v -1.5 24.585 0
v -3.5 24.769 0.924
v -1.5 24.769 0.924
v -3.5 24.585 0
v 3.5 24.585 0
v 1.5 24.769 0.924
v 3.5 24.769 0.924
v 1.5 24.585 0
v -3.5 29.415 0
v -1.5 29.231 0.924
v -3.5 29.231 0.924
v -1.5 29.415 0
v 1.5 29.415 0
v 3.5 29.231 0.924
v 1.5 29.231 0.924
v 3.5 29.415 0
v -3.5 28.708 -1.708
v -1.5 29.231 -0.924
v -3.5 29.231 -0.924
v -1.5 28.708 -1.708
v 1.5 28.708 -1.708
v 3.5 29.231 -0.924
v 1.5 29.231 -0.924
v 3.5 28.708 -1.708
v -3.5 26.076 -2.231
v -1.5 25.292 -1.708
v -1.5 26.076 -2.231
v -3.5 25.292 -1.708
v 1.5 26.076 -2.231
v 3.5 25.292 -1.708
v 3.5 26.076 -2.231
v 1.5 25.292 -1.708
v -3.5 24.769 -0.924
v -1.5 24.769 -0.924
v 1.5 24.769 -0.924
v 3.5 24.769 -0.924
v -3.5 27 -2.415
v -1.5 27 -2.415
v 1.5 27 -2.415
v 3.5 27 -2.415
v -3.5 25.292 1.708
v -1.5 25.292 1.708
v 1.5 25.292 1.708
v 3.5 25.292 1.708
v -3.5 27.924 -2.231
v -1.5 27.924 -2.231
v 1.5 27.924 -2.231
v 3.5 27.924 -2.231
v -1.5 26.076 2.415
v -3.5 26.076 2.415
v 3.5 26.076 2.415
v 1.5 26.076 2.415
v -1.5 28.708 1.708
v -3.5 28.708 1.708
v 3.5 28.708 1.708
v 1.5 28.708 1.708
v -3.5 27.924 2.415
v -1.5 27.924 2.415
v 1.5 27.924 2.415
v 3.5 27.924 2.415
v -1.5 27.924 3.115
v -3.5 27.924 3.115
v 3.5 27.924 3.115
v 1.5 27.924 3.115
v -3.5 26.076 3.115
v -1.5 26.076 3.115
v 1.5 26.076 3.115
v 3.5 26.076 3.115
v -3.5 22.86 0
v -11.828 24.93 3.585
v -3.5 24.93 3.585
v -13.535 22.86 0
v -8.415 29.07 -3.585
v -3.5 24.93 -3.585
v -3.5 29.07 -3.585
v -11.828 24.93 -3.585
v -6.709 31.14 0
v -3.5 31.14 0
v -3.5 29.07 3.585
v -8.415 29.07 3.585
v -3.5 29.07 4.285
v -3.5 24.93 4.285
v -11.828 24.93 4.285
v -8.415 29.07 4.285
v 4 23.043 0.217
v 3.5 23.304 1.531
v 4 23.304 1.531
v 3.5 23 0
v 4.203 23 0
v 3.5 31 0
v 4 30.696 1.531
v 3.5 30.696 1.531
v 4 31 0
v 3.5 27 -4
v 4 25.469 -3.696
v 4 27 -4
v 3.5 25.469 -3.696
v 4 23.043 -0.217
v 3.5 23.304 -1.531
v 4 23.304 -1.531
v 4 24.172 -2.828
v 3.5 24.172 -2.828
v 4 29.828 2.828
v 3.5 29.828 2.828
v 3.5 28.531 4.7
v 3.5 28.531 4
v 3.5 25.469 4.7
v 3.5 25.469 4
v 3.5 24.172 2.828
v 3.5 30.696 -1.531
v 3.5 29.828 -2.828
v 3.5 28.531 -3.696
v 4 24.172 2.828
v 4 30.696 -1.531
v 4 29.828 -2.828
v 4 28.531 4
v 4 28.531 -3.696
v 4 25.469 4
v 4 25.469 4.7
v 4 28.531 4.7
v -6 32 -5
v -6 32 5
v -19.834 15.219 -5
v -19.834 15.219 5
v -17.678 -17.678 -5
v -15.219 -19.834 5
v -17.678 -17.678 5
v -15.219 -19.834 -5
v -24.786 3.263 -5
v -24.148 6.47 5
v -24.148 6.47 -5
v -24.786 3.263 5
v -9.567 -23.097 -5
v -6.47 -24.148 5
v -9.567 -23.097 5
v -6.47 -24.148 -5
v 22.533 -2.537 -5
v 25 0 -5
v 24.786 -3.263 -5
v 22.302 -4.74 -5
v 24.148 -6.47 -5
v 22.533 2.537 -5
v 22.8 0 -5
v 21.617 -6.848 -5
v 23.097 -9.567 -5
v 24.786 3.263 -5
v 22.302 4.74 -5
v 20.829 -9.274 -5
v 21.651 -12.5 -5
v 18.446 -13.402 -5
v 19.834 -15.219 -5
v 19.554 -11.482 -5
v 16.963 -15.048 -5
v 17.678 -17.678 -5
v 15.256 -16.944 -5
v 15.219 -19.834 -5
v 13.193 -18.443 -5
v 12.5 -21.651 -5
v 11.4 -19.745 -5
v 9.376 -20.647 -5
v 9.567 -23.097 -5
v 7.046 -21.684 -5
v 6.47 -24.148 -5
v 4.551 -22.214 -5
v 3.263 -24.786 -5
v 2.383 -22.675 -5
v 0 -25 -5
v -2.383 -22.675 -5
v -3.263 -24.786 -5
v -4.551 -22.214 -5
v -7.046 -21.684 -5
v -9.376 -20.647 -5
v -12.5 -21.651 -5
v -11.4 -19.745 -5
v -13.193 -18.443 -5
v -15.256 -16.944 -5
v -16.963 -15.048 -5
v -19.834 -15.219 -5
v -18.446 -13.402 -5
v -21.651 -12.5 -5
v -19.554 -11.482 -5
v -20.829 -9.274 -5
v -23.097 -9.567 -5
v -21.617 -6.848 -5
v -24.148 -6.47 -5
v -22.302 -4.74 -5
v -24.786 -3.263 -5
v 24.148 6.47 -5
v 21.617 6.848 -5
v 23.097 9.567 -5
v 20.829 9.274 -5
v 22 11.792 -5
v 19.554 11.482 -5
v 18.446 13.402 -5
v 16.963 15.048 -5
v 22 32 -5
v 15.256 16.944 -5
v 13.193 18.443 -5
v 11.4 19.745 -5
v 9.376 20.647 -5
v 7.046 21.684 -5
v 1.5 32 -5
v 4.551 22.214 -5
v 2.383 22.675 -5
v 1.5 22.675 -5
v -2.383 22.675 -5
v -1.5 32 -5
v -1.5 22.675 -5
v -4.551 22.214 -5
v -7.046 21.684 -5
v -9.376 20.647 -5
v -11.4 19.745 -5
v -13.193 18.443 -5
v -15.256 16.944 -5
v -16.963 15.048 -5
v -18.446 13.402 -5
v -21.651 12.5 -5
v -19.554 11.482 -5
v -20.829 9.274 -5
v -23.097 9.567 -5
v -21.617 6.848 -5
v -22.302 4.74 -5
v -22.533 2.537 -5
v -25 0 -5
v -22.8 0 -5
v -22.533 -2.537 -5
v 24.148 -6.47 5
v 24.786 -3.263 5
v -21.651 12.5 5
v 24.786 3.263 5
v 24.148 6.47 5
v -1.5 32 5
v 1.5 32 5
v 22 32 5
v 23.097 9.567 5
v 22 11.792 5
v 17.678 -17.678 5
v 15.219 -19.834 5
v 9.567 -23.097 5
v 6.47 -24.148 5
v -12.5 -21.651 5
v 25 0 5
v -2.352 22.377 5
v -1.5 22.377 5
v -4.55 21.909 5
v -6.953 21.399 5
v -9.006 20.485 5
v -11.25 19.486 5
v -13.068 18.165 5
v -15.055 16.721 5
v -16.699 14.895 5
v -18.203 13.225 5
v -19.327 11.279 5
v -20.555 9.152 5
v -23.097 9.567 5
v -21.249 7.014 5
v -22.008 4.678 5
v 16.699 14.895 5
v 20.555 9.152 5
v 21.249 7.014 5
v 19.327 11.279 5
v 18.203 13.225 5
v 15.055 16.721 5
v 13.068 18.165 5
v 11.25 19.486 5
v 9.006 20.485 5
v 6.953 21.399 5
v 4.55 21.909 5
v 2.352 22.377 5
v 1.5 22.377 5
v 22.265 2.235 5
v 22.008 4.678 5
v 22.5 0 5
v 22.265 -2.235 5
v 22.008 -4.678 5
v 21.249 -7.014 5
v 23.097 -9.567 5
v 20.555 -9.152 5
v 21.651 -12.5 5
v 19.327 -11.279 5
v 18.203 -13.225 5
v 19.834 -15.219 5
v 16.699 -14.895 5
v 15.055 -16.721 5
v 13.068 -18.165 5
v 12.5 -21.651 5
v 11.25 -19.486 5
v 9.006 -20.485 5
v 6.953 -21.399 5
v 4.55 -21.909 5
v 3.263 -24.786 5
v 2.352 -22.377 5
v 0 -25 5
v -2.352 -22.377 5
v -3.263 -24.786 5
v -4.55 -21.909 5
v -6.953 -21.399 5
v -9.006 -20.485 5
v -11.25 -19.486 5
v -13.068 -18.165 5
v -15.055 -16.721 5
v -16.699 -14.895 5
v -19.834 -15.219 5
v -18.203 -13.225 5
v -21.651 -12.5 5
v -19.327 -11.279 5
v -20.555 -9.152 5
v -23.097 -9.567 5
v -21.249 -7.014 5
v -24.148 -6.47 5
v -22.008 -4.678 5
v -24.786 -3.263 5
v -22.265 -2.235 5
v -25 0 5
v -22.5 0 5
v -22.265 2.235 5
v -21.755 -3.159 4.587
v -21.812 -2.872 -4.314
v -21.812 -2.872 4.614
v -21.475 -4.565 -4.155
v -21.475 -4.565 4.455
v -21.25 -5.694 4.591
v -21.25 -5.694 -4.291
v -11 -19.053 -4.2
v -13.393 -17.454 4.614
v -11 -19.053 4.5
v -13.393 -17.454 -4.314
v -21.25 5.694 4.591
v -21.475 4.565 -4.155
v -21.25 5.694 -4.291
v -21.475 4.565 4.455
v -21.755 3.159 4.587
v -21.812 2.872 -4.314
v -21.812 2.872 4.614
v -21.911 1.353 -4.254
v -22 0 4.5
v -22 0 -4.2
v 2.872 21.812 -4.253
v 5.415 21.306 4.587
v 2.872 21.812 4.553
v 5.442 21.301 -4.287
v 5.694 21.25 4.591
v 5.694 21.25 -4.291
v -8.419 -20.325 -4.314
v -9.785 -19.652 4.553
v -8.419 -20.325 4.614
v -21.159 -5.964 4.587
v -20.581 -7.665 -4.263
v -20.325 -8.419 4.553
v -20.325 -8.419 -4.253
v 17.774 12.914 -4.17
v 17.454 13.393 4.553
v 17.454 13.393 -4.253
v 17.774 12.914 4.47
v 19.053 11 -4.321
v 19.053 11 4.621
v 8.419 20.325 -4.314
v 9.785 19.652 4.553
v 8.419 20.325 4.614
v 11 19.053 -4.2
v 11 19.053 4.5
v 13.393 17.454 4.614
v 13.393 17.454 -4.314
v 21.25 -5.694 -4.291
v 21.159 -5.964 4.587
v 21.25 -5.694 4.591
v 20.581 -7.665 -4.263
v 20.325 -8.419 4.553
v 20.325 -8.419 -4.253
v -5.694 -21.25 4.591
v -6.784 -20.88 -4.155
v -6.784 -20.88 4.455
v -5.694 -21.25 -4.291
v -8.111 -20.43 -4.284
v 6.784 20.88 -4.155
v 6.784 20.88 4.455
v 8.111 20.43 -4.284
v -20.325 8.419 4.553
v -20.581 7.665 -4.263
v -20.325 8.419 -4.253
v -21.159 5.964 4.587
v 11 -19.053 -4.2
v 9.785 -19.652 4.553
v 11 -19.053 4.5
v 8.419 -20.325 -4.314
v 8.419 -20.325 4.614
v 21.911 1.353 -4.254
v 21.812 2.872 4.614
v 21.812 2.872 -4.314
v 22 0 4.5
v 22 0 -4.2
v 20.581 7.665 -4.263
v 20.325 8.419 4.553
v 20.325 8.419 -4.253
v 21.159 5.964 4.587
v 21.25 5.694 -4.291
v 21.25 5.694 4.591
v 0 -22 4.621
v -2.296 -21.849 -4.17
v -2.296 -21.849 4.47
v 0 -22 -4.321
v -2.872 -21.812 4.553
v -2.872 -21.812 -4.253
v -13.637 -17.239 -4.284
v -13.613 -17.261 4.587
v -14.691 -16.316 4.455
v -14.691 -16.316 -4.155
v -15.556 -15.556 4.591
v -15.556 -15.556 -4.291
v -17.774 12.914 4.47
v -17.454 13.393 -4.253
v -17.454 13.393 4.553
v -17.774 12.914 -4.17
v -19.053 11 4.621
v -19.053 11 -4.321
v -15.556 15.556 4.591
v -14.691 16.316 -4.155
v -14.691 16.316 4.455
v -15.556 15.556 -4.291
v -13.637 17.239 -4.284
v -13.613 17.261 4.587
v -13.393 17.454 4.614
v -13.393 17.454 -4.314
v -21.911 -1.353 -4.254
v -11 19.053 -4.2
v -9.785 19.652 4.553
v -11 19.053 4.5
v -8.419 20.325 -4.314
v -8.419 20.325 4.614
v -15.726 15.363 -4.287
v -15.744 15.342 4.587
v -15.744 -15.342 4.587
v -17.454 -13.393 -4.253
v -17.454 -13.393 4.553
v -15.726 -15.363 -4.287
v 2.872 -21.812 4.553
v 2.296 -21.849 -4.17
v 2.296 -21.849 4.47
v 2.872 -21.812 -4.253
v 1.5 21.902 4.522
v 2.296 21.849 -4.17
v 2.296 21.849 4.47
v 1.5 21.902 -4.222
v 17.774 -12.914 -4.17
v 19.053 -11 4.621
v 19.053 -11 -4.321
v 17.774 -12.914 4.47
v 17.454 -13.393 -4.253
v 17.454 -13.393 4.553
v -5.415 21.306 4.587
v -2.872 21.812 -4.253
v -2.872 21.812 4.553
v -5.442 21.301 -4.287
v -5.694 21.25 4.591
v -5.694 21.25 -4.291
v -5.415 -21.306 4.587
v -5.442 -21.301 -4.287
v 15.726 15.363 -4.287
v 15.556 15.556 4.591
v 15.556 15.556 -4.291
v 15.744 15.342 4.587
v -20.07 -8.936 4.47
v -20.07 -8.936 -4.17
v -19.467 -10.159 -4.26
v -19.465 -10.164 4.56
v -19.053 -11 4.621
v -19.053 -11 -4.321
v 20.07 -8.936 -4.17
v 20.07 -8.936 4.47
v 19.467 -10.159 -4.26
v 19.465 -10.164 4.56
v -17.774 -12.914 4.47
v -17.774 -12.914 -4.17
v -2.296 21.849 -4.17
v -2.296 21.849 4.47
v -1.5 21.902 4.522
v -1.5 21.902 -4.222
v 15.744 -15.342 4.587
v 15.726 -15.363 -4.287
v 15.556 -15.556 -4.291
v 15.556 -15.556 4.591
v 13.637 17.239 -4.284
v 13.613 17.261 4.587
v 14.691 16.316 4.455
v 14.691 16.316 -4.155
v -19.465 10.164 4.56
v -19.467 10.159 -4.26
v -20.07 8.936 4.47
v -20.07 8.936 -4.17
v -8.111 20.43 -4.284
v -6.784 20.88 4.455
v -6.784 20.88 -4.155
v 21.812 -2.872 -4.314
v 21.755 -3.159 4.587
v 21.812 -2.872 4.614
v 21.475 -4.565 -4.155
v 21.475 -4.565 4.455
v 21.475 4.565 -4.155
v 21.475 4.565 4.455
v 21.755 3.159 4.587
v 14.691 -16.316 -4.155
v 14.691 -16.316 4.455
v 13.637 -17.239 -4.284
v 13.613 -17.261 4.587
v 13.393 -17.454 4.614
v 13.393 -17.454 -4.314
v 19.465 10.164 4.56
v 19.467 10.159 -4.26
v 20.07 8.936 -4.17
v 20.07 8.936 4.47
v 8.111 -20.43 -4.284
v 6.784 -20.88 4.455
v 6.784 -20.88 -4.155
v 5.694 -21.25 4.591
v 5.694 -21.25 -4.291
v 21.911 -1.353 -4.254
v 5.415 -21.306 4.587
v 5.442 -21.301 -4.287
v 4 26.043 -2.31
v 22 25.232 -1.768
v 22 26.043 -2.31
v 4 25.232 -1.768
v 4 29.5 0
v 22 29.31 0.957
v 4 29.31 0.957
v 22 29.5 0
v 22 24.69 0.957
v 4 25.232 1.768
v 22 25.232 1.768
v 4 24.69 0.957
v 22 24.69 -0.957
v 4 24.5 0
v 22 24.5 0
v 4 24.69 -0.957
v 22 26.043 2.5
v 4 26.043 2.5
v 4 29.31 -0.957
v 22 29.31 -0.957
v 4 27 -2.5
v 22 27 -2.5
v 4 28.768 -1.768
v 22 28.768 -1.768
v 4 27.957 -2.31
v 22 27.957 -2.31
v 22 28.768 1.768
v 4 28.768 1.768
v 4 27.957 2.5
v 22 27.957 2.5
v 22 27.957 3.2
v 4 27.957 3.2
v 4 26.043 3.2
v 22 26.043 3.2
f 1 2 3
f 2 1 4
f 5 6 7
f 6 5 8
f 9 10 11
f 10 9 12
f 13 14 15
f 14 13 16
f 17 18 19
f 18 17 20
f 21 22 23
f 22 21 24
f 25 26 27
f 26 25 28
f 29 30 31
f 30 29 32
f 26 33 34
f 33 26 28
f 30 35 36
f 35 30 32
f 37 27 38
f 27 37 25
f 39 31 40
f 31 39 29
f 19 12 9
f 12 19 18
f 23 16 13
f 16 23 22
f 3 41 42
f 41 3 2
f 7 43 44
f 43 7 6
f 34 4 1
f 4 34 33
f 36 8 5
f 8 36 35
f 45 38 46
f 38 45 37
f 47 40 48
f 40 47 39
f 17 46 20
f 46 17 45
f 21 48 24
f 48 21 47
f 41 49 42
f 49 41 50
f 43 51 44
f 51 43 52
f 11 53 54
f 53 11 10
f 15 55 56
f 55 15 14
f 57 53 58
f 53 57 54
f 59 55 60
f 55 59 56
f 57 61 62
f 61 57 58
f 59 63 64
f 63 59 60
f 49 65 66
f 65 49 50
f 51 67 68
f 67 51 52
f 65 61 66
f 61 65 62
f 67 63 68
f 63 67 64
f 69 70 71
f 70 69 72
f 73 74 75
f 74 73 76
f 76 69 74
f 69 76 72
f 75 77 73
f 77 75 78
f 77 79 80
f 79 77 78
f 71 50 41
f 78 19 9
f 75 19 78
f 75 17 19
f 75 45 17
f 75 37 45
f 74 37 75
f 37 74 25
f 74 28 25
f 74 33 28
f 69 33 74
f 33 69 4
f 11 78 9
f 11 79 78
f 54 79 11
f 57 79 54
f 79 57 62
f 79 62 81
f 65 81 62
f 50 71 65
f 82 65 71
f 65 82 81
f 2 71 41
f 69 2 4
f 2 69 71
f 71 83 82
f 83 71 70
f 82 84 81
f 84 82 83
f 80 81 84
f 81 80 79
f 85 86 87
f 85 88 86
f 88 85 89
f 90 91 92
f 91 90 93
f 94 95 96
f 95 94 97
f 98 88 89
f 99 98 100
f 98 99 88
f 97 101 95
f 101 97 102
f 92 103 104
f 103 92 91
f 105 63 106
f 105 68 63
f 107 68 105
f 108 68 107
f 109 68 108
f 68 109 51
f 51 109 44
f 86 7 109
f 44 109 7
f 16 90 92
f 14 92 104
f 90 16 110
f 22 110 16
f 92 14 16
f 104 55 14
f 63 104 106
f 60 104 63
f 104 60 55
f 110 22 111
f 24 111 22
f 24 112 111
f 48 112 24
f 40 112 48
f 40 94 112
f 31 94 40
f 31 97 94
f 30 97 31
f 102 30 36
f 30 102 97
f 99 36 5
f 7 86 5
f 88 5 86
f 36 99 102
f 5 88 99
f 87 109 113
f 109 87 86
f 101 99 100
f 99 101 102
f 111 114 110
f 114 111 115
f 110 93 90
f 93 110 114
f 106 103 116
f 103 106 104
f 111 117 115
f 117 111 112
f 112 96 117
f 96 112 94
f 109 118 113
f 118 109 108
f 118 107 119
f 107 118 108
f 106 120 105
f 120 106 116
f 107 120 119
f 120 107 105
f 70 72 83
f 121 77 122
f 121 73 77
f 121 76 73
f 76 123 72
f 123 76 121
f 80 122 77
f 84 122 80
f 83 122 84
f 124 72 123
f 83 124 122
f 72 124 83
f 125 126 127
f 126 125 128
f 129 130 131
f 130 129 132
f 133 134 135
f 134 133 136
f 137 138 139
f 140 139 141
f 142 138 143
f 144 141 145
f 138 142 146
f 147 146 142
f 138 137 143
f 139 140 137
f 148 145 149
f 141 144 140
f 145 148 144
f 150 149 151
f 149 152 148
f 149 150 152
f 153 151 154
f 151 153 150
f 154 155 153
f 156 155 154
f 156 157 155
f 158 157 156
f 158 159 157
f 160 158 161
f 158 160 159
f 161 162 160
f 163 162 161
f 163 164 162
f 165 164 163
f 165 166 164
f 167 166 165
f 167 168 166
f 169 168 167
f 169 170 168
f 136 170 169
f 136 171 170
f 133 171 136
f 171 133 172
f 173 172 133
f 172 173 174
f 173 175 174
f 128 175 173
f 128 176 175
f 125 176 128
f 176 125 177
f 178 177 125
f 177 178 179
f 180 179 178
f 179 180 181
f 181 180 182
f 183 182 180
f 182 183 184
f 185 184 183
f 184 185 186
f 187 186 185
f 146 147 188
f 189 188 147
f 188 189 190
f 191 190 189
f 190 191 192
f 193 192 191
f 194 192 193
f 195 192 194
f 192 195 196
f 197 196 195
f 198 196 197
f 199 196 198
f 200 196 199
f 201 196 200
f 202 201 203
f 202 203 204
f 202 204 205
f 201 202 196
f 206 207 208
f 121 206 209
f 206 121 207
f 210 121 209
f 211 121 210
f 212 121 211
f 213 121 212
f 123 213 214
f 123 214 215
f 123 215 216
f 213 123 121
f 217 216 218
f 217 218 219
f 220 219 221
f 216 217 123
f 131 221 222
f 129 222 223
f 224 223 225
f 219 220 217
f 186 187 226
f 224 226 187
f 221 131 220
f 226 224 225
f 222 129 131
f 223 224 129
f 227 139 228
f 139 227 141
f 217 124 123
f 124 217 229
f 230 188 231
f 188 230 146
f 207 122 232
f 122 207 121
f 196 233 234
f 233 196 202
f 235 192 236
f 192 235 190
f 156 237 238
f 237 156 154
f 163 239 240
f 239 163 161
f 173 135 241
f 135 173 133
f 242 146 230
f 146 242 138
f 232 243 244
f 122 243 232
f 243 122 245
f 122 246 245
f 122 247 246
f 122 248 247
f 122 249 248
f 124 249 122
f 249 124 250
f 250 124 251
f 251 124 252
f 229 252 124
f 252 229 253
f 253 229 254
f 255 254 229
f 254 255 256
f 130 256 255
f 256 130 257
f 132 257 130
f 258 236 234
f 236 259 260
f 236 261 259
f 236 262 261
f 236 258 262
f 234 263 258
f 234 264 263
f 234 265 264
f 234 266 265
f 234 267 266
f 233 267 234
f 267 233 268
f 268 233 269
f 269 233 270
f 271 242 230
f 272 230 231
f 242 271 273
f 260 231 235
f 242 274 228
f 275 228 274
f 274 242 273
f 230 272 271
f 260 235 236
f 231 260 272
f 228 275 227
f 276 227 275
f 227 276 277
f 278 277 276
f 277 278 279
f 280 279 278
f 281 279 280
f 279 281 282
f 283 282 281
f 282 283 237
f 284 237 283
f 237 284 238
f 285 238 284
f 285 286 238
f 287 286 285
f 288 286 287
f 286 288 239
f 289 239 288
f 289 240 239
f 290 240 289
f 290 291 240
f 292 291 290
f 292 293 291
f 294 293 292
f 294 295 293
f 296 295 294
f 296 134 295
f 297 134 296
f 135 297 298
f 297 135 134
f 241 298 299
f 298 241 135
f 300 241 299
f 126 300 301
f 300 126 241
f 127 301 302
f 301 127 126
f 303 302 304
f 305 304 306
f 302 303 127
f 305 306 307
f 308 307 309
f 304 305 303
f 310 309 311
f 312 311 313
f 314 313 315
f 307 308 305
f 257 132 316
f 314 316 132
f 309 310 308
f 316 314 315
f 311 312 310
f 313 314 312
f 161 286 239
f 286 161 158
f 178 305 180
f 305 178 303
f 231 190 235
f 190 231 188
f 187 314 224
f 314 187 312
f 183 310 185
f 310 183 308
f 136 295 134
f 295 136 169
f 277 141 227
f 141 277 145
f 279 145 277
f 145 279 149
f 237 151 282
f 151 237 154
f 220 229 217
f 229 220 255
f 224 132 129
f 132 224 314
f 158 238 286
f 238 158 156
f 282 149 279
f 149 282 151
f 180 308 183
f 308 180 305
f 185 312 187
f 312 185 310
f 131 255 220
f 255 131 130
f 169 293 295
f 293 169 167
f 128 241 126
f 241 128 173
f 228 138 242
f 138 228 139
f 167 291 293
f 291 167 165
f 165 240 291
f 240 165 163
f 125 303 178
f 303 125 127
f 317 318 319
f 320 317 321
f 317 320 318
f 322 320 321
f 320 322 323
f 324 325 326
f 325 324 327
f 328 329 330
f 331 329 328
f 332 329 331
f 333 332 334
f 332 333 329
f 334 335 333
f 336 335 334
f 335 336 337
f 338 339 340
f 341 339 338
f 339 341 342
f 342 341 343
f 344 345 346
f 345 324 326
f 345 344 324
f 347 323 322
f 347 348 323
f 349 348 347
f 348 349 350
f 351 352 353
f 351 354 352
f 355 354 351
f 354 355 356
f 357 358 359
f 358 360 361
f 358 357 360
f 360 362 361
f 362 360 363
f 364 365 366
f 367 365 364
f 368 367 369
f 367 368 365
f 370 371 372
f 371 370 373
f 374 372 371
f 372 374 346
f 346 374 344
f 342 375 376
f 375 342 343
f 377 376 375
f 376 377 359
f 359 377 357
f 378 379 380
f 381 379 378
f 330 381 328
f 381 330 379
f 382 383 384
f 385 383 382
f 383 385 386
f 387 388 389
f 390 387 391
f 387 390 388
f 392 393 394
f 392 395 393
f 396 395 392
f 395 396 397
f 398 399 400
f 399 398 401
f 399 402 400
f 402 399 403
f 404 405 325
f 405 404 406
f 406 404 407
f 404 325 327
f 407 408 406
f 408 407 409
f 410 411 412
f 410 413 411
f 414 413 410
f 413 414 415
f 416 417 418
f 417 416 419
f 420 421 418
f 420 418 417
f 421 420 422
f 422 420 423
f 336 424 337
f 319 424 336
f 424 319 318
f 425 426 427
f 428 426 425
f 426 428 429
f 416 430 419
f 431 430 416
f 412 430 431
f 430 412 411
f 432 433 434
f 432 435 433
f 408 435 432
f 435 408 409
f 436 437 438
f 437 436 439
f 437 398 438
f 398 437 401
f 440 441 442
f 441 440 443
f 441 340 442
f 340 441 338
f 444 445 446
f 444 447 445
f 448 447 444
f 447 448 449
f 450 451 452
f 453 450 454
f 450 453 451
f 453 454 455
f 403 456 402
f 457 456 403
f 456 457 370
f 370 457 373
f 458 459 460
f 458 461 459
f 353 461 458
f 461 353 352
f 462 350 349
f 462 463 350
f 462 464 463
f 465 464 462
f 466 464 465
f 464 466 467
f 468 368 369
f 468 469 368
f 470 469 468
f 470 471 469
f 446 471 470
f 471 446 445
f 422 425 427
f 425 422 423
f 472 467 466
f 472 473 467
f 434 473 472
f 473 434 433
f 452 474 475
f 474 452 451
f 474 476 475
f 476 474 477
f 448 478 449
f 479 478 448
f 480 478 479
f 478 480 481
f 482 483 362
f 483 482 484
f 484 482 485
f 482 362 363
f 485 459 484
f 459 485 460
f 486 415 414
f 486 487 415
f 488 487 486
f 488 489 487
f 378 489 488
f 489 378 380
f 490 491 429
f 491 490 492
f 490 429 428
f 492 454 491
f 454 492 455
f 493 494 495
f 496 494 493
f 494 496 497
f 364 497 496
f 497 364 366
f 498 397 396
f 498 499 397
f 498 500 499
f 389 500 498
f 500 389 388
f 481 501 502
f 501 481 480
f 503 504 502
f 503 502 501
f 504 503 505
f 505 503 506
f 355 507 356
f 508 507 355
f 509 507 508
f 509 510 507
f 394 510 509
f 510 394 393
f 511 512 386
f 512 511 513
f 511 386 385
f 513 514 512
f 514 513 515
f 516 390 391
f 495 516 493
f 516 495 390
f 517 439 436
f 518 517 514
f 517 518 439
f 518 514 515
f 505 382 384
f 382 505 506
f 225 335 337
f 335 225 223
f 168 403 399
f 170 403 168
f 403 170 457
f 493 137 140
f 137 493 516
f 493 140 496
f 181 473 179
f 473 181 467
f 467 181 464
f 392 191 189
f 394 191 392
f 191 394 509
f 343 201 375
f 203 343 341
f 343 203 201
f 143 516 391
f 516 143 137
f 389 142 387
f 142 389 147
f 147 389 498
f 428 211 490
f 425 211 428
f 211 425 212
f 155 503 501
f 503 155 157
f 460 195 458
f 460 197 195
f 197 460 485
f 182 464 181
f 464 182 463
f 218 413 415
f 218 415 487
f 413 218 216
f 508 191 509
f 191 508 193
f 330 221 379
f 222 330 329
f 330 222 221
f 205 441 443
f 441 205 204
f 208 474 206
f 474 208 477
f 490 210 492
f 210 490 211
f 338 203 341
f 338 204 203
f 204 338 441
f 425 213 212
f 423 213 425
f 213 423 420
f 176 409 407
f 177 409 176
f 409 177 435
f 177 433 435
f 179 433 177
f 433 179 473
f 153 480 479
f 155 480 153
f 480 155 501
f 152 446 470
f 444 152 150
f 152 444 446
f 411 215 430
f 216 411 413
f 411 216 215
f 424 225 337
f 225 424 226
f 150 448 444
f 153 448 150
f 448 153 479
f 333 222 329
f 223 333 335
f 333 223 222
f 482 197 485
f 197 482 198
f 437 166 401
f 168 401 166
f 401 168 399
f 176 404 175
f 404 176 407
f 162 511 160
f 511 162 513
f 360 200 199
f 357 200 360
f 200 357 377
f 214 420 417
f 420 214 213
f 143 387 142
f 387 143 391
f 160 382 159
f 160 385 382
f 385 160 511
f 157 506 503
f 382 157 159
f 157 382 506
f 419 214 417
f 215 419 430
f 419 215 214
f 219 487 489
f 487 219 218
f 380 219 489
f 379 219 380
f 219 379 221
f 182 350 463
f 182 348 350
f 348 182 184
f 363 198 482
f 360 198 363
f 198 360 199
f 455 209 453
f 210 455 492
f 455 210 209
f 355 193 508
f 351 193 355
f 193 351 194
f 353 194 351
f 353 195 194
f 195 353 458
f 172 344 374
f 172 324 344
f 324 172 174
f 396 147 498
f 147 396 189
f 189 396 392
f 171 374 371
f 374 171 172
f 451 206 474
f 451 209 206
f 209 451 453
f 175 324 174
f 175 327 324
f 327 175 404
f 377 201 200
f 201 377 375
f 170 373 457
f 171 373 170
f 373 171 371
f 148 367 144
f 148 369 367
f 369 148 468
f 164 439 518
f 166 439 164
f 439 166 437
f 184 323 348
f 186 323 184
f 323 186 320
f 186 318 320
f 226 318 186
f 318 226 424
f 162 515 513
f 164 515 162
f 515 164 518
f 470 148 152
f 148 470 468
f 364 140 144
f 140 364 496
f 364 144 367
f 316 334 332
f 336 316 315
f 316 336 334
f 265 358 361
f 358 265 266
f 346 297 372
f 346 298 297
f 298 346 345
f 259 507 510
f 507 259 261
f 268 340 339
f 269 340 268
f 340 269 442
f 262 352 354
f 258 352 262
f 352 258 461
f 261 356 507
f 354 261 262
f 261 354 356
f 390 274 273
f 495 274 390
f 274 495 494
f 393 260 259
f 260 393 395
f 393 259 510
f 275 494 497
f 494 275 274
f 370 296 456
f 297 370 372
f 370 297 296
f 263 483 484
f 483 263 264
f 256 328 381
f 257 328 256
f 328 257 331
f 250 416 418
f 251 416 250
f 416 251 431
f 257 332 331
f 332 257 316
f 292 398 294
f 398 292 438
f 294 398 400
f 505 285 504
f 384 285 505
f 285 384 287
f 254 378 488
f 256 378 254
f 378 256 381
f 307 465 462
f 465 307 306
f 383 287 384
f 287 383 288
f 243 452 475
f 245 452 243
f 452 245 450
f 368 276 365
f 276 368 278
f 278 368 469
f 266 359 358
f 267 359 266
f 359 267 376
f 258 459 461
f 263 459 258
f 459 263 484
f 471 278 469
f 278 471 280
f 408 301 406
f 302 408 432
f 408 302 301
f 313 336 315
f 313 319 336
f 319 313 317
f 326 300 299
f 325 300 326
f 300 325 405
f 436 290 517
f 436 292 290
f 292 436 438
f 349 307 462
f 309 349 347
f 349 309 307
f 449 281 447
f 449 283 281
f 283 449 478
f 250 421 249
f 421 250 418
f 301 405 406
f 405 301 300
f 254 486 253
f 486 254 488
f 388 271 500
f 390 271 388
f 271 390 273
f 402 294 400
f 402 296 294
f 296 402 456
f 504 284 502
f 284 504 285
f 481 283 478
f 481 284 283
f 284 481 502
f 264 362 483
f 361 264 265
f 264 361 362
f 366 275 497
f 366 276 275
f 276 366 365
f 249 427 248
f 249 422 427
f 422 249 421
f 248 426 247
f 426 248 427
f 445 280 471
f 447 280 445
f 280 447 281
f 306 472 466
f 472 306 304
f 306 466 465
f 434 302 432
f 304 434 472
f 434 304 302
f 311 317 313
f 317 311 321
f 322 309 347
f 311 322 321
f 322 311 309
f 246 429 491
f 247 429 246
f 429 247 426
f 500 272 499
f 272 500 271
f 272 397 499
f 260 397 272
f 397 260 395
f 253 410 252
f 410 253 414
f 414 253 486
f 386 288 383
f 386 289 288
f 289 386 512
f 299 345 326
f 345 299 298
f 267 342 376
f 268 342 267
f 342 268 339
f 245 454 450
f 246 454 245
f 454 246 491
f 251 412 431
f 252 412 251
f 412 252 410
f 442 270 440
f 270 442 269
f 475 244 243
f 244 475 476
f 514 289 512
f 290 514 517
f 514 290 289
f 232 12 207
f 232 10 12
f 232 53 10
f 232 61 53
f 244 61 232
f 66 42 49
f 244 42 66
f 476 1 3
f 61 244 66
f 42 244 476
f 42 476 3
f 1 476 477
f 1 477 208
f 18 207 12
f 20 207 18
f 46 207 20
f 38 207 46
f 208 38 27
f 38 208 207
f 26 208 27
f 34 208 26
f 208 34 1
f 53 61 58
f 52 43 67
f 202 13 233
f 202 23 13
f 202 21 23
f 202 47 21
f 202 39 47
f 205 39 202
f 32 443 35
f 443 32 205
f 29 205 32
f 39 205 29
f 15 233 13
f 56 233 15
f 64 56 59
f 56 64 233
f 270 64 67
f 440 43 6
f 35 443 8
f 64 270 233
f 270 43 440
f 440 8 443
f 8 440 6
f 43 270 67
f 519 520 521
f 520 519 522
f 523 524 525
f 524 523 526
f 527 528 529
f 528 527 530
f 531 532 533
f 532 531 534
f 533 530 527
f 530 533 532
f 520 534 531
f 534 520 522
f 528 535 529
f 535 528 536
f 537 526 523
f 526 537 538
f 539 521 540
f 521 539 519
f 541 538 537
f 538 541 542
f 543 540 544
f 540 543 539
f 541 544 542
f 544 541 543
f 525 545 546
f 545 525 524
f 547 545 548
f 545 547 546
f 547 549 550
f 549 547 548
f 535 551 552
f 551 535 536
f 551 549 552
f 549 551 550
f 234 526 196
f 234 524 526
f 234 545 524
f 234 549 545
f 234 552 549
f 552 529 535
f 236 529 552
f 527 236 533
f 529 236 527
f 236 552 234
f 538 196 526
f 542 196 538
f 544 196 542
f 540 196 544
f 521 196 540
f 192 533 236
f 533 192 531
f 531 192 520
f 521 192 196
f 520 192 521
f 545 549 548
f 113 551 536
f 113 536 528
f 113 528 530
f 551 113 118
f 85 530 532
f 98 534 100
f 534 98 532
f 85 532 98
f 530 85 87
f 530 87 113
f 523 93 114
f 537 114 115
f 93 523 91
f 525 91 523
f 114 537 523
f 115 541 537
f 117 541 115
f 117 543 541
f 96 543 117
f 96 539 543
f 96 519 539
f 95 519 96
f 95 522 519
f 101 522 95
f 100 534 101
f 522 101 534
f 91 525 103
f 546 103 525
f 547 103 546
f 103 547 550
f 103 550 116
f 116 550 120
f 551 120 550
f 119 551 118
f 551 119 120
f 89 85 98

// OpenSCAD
// file: ../standard_optomechanics/cylinder_clamp.scad
use <../utilities.scad>;
d=0.05;

//for 1 inch/25mm post clamp, an inner radius of 12.8 is good.
	
module cylinder_clamp(
	inner_r=12.8, //radius of the cylinder being clamped (ish!)
	clamp_h=11, //thicknedess of the clamp along the cylinder axis
	clamp_t=4, //thickness of the clamp radially
	flat_t=8, //how thick the bottom of the clamp is (often need to allow for the mounting bolt head here)
	flat_width=15, //width of the flat base
	mounting_bolt=4, //nominal size of mounting bolt (default is 4 for M4, 0 to disable)
	nut_trap=false,
	bevel_top=0.5, //size of 45 degree bevel on top surface
	bevel_bottom=0.8 //size of 45 degree bevel on bottom of hole
	){
	assign(
		post_r = inner_r, //poor initial choice of name!
		bolt_flat_w=10, //width of the region where the bolt is
		gap_w=3 //size of the gap that is squeezed by the bolt
	)
	difference(){
		hull(){
			cylinder(h=clamp_h,r=post_r+clamp_t,center=true,$fn=48);
			translate([0,-post_r-flat_t/2,0]) cube([flat_width,flat_t,clamp_h],center=true);
			translate([0,post_r+bolt_flat_w/2,0]) cube([12,bolt_flat_w,clamp_h],center=true);
		}
	
		cylinder(h=9999,r=post_r,center=true,$fn=48); //cylinder being clamped
		//bevels, top and bottom
		translate([0,0,-clamp_h/2]) cylinder(r1=post_r+3*bevel_bottom,r2=post_r-bevel_bottom,h=4*bevel_bottom,center=true);
		translate([0,0,clamp_h/2]) cylinder(r2=post_r+3*bevel_top,r1=post_r-bevel_top,h=4*bevel_top,center=true);
		//gap (squeezed by bolt)
		translate([0,999,0]) cube([gap_w,999*2,999],center=true); //gap
	
		//clamping bolt
		translate([gap_w/2+2,post_r+bolt_flat_w/2,0]) rotate([0,0,-90]) nut_y(4,h=999,shaft=true);
		translate([-gap_w/2-2,post_r+bolt_flat_w/2,0]) rotate([0,0,90]) cylinder_with_45deg_top(r=4,h=999,$fn=16); //counterbore for nut head
	
		if(mounting_bolt > 0){
			//mounting bolt
			translate([0,-post_r-4.5,0]) rotate([-90,0,0]){
				intersection(){
					rotate([90,0,0])
						if(nut_trap){
							nut_y(mounting_bolt,fudge=1.15,shaft=true,h=999);
						}else{
							screw_y(mounting_bolt,fudge=1.07,shaft=true,h=999);
						}
					cube([inner_r*2,inner_r*2,clamp_h*2],center=true);
				}
			}
		}
		//in the case of thick clamps with thin flats, this keeps the bottom flat
		translate([0,-inner_r-flat_t-999,0]) cube([9999,999*2,9999],center=true);
	}
}

module cylinder_clamp_v(
	inner_r=12.8, //radius of the cylinder being clamped (ish!)
	clamp_h=10, //width of the clamp along the cylinder (y) axis
	clamp_t=4, //thickness of the clamp radially
	flat_t=8, //how thick the bottom of the clamp is (often need to allow for the mounting bolt head here)
	flat_width=15, //width of the flat base
	mounting_bolt=4, //nominal size of mounting bolt (default is 4 for M4, 0 to disable)
	bevel=0.5 //put a 45 degree bevel on the edges of the hole
	){
	assign(
		post_r = inner_r, //poor initial choice of name!
		bolt_flat_w=11, //width of the region where the bolt is
		gap_w=2*inner_r*sin(45/2),//sin(acos(1-(9/2-4/2*1.22)/inner_r))*inner_r //size of the gap that is squeezed by the bolt
		bolt_z = inner_r+4/2*1.22+d //position of bolt (so bolt just clears the cylinder we're clamping
	)assign( //the second assign statement allows us to use gap_w
		bolt_span=gap_w+4+d//max(2*inner_r*sin(acos(1-(9/2-4/2*1.22)/inner_r)), gap_w+4)
	)
	difference(){
		hull(){
			rotate([90,0,0]) cylinder(h=clamp_h,r=inner_r+clamp_t,center=true,$fn=48);
			translate([0,0,-inner_r-flat_t/2]) cube([flat_width,clamp_h,flat_t],center=true);
			translate([0,0,bolt_z]) cube([gap_w+9,clamp_h,bolt_flat_w],center=true);
		}
	
		cylinder_with_45deg_top(h=9999,r=post_r,center=true,$fn=48); //cylinder being clamped
		reflect([0,1,0]) translate([0,clamp_h/2,0]) rotate([90,0,0]) cylinder(r1=post_r+3*bevel,r2=post_r-bevel,h=4*bevel,center=true); //bevel
		translate([0,0,999]) cube([gap_w,999,999*2],center=true); //gap
	
		//clamping bolt
		translate([bolt_span/2,0,bolt_z]) rotate([0,0,-90]) nut_y(4,h=999,shaft=true);
		translate([-bolt_span/2,0,bolt_z]) rotate([0,0,90]) cylinder_with_45deg_top(r=4,h=999,$fn=16); //counterbore for nut head
	
		if(mounting_bolt > 0){
			//mounting bolt
			translate([0,0,-post_r-4.5]){
				cylinder(r=mounting_bolt*1.1,h=post_r,$fn=16);
				cylinder(r=mounting_bolt/2*1.22,h=flat_t*2,center=true,$fn=16);
			}
		}
		translate([0,0,-inner_r-flat_t-999]) cube([9999,9999,999*2],center=true);
	}
}

translate([0,30,0]) cylinder_clamp_v(30.5/2, 10, flat_width=24, mounting_bolt=4, flat_t=8);

cylinder_clamp(30.5/2, flat_width=24, mounting_bolt=4, flat_t=8,nut_trap=true);
// main file
use <../standard_optomechanics/cylinder_clamp.scad>;
use <../utilities.scad>;

t = 3;
h = 10;
inner_r = 22;


union(){
	mirror([1,0,0]) cylinder_clamp(inner_r=inner_r,clamp_h=h,flat_width=0,flat_t=t,mounting_bolt=0,clamp_t=t);
	difference(){
		translate([4,0,-h/2]) cube([inner_r-4,inner_r+10,h]);
		cylinder(r=inner_r+t/2,h=999,center=true);
		translate([0,inner_r+5,0]) rotate(-90) cylinder_with_45deg_top(r=2.5,h=999,$fn=16); 
	}
}
